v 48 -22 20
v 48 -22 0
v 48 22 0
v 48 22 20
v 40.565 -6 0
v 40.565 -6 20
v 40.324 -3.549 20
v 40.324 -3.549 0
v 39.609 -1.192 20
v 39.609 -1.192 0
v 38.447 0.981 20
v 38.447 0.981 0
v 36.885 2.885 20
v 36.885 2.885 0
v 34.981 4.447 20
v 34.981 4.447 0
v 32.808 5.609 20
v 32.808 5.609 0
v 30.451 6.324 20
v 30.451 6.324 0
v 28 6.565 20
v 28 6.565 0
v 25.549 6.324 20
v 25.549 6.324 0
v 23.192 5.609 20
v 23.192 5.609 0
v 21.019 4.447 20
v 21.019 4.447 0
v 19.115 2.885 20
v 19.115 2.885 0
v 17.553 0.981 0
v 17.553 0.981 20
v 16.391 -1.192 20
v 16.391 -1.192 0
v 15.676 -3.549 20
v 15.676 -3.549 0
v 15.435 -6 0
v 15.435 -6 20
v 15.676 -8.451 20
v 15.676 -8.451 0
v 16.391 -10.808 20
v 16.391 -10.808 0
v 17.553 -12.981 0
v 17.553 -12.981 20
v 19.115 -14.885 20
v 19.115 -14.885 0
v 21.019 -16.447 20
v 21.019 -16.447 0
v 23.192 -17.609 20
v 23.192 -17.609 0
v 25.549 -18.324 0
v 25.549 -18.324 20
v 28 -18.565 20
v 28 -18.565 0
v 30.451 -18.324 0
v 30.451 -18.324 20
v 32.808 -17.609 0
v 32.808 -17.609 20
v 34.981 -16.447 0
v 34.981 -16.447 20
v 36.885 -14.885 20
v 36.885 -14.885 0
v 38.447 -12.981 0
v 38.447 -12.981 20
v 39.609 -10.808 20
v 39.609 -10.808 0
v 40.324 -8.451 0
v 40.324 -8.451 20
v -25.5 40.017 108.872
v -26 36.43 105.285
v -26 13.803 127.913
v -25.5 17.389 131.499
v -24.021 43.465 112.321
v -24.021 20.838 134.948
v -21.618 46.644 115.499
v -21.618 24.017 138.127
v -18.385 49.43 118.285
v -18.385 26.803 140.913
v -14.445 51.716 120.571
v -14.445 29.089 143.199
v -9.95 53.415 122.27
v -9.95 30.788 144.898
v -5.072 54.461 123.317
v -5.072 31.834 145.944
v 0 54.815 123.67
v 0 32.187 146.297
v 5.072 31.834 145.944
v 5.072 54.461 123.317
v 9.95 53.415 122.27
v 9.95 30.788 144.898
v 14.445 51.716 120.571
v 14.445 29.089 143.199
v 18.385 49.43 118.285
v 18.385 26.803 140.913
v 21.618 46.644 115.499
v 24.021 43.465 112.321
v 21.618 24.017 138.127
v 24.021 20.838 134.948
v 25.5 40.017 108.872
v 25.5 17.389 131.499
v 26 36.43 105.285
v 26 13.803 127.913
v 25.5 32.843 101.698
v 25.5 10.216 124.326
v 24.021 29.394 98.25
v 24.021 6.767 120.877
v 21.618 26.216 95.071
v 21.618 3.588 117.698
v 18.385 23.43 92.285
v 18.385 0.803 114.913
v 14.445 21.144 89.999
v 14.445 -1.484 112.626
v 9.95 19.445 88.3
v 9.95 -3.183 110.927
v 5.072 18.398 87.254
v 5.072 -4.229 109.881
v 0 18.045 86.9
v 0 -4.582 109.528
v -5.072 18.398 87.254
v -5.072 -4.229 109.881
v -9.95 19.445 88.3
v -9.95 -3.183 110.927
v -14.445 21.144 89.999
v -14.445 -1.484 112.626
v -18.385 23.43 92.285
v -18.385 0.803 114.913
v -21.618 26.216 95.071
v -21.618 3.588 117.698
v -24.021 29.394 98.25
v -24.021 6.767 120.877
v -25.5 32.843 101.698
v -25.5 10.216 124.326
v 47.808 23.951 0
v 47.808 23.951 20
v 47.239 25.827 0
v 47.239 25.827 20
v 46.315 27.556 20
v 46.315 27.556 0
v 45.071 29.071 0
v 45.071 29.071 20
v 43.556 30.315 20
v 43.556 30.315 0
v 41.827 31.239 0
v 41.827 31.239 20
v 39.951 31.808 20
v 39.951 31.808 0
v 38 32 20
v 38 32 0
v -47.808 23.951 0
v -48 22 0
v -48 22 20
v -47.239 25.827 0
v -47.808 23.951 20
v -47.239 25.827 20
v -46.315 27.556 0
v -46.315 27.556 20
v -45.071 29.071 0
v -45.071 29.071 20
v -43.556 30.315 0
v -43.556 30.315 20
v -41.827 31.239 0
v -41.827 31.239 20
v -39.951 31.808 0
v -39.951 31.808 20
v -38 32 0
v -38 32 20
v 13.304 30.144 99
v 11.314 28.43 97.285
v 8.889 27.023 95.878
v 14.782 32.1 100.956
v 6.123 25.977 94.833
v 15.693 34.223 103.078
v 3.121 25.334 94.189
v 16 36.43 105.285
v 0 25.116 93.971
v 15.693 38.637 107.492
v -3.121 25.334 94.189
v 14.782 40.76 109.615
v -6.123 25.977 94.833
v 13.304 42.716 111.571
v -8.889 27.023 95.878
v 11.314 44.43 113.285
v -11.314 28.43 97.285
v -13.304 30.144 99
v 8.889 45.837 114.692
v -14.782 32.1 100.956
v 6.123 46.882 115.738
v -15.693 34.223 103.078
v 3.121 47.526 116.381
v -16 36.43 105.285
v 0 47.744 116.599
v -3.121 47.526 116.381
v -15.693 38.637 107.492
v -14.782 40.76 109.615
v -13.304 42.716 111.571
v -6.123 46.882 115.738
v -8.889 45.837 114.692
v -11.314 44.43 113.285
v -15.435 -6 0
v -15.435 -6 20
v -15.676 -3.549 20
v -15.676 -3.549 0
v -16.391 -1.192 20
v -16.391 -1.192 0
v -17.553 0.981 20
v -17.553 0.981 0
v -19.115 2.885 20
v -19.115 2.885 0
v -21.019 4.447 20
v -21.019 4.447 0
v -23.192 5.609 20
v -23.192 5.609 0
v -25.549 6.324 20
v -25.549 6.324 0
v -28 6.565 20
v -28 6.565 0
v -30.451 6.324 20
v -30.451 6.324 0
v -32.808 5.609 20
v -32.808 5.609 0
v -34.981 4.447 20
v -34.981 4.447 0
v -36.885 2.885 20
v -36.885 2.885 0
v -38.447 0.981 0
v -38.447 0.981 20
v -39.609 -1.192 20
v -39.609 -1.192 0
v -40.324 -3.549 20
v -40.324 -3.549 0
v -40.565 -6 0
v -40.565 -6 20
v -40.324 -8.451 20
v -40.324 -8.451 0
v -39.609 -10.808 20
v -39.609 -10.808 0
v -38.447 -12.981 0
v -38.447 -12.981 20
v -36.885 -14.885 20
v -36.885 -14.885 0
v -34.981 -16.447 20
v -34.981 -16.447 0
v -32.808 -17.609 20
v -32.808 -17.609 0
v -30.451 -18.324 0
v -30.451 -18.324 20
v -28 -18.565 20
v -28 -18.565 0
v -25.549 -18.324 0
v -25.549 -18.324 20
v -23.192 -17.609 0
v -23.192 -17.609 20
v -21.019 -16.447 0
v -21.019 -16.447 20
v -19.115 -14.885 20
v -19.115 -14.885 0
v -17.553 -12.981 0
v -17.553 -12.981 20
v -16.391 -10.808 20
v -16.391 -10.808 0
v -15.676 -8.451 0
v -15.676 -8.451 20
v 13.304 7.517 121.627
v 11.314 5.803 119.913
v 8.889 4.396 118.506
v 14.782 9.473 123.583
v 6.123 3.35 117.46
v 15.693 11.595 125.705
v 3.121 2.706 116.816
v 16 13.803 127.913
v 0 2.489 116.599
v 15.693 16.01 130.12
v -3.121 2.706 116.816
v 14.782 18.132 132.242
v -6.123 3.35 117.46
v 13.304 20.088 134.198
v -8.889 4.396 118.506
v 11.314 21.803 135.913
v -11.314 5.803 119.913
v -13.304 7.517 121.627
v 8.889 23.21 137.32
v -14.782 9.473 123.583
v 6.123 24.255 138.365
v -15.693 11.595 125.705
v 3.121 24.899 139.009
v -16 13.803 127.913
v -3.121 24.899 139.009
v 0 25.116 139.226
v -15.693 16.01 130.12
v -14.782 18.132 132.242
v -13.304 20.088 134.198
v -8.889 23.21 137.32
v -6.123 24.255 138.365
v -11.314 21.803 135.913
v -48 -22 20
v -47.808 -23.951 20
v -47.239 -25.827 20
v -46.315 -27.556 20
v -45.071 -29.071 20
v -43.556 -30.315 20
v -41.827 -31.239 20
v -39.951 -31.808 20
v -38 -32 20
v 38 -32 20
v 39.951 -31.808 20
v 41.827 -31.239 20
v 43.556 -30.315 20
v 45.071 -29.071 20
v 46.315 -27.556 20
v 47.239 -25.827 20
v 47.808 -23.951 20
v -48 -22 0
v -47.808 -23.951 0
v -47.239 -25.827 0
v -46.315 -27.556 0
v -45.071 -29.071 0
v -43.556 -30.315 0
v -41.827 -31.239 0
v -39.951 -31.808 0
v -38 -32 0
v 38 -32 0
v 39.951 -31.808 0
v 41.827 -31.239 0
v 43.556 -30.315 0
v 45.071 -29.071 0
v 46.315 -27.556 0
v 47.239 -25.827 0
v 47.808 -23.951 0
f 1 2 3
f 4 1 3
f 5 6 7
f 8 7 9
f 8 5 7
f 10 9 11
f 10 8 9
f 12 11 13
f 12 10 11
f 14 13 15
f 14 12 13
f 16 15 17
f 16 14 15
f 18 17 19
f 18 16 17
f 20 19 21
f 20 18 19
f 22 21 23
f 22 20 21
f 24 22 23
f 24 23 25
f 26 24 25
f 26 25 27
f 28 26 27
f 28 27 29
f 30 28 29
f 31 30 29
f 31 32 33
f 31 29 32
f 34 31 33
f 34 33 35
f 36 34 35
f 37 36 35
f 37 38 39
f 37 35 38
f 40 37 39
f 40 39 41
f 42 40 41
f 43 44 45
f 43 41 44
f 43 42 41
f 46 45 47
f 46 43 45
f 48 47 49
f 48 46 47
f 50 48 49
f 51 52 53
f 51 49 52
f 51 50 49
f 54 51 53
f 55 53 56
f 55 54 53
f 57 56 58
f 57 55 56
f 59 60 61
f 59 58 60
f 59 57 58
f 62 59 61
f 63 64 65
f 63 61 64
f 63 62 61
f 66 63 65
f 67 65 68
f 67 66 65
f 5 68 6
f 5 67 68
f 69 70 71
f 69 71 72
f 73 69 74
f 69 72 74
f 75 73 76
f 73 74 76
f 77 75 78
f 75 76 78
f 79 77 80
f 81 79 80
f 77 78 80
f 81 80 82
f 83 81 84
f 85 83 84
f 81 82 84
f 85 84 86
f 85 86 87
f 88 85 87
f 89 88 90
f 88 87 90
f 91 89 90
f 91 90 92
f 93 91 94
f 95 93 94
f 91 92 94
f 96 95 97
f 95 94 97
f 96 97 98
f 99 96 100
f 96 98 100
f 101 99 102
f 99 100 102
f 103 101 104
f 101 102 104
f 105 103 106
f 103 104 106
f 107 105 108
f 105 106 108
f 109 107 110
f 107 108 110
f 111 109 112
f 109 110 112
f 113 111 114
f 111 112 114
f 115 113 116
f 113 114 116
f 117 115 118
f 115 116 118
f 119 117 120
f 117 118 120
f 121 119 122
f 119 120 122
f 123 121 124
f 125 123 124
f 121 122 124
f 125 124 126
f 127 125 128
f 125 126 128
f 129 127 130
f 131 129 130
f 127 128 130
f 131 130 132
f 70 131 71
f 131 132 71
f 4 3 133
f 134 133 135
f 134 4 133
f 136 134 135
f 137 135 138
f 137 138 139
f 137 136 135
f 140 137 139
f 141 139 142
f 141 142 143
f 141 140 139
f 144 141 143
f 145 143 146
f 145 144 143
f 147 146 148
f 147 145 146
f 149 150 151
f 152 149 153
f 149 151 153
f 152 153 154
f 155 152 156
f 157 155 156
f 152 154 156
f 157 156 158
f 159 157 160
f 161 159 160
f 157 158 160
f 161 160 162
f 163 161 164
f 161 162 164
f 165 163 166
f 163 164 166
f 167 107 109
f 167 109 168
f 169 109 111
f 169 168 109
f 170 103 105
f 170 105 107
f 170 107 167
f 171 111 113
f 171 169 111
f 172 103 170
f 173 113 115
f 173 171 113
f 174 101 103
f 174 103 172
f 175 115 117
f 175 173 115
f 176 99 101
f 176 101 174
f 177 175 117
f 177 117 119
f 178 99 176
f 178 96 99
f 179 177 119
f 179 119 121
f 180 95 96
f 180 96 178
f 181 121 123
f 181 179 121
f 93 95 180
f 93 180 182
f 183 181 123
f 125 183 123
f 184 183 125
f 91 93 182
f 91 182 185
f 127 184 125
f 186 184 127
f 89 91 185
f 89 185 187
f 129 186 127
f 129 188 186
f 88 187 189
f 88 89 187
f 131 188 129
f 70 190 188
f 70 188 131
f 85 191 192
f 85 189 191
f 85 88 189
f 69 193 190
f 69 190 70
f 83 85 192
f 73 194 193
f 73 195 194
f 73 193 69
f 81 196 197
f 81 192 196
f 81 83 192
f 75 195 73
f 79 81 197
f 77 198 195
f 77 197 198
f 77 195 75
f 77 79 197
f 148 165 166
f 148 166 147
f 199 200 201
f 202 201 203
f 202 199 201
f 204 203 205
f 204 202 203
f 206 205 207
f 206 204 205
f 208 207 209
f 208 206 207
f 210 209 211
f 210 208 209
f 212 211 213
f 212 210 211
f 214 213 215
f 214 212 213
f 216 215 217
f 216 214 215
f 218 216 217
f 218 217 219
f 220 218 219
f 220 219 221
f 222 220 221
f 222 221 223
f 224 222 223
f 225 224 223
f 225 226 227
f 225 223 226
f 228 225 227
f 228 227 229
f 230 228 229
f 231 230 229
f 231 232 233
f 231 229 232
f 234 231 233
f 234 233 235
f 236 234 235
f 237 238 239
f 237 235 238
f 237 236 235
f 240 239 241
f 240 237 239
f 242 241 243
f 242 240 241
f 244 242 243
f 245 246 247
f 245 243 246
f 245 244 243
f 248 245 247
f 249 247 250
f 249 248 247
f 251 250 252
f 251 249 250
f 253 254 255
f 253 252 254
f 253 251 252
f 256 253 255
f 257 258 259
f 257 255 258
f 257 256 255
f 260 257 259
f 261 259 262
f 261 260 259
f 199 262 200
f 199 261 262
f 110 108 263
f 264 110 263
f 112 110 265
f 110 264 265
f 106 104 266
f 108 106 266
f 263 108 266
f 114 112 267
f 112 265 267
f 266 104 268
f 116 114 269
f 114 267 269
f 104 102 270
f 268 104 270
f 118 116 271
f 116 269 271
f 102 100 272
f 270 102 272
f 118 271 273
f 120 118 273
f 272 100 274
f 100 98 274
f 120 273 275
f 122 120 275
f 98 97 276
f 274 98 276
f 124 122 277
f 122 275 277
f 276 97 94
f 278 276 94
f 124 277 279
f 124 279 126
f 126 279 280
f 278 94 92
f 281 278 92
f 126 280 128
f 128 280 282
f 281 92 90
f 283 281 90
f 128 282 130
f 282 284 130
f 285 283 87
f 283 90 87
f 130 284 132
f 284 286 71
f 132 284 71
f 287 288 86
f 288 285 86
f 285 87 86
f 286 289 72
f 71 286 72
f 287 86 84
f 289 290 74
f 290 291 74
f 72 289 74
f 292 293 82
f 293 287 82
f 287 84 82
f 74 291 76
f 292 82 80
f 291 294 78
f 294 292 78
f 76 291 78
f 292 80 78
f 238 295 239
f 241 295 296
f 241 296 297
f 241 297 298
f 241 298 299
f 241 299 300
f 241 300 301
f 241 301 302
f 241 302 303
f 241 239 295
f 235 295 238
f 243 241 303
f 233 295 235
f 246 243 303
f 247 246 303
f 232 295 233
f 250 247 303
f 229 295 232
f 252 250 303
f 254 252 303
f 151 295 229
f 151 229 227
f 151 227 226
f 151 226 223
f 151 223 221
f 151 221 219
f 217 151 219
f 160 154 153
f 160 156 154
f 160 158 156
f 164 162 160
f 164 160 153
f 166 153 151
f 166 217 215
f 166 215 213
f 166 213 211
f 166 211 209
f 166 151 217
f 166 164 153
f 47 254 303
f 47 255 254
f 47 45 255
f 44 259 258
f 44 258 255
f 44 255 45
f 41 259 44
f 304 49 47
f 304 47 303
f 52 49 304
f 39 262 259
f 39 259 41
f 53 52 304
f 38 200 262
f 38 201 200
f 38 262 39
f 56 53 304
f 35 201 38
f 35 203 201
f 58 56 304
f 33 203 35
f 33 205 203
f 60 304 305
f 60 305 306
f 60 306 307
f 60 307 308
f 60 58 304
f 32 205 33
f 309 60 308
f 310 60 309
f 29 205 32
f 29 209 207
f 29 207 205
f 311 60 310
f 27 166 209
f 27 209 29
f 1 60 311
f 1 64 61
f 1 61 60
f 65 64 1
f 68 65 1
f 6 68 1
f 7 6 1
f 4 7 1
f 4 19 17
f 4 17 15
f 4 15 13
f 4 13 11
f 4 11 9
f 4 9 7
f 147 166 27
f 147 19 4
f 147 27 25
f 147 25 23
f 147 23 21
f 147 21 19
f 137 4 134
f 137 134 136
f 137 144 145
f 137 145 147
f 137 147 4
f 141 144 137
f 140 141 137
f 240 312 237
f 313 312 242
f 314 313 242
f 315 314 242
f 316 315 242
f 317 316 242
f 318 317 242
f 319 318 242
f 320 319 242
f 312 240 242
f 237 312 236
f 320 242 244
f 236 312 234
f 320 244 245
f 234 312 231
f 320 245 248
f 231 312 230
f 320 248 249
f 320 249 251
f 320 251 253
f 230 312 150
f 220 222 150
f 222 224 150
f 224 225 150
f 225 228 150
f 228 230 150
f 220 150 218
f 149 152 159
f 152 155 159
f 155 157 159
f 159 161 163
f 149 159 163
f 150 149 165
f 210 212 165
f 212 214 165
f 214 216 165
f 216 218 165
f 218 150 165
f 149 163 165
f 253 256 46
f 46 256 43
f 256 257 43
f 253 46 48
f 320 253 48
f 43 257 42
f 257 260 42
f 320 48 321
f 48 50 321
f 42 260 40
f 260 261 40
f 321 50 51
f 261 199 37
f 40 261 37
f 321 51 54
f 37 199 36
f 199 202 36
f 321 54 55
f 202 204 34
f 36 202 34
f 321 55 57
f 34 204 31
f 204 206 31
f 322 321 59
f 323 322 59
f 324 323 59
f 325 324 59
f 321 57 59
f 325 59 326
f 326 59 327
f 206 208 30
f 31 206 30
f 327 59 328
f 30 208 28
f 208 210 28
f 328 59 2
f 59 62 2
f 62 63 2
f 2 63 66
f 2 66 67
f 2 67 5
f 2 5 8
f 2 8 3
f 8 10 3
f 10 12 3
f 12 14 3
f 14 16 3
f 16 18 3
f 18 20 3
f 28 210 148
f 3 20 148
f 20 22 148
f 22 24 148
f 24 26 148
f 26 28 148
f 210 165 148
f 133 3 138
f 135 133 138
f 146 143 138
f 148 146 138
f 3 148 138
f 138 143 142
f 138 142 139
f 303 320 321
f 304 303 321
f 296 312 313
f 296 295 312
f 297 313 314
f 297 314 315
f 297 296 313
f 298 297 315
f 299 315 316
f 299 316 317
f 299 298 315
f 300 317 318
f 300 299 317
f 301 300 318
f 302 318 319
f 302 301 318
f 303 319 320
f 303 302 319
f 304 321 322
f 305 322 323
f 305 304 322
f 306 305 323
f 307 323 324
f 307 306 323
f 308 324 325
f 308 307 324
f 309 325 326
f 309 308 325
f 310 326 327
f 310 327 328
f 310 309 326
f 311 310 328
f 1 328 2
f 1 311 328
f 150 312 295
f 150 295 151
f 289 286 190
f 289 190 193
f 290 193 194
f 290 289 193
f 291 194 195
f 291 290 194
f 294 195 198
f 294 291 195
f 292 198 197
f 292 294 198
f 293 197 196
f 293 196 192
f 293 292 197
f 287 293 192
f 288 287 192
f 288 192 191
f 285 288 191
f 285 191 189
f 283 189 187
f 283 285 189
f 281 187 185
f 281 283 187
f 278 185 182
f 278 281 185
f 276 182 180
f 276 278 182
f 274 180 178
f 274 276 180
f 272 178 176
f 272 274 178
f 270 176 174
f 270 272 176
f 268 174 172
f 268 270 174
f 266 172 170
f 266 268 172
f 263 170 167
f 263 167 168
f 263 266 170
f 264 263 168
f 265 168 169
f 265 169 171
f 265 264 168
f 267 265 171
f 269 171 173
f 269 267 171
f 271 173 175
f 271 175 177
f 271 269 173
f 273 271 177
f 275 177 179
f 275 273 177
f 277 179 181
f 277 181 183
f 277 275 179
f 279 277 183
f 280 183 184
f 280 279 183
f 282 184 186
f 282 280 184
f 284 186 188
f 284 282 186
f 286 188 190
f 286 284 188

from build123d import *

# Parameters (mm, degrees)
F0_W     = 96
F0_H     = 64
F1_DEPTH = 20
F2_R     = 10
F3_R     = 12.5650724874
F4_DEPTH = 25
F8_R     = 26
F8_R_2   = 16
F9_DEPTH = 32


with BuildPart() as f1:
    # F0 (on Top) → F1 (new body)
    with BuildSketch(Plane.XY):
        Rectangle(F0_W, F0_H)
    extrude(amount=F1_DEPTH)

    # F2
    f2_edges = [f1.edges().sort_by_distance(p)[0] for p in [
        (-48, -32, 10),
        (48, -32, 10),
        (48, 32, 10),
        (-48, 32, 10),
    ]]
    fillet(f2_edges, radius=F2_R)

    # F3 (on Top) → F4 (cut)
    with BuildSketch(Plane.XY):
        with Locations((28, -6)):
            Circle(F3_R)
        with Locations((-28, -6)):
            Circle(F3_R)
    extrude(amount=F4_DEPTH, mode=Mode.SUBTRACT)


with BuildPart() as f9:
    # F8 (on offset) → F9 (new body)
    with BuildSketch(Plane(origin=(0, -57.0549957007, 57.0549957007), x_dir=(-1, 0, 0), z_dir=(0, 0.7071067812, -0.7071067812))):
        with Locations((0, 100.2076724347)):
            Circle(F8_R)
        with Locations((0, 100.2076724347)):
            Circle(F8_R_2, mode=Mode.SUBTRACT)
    extrude(amount=F9_DEPTH)


solid = Compound([f1.part, f9.part])
